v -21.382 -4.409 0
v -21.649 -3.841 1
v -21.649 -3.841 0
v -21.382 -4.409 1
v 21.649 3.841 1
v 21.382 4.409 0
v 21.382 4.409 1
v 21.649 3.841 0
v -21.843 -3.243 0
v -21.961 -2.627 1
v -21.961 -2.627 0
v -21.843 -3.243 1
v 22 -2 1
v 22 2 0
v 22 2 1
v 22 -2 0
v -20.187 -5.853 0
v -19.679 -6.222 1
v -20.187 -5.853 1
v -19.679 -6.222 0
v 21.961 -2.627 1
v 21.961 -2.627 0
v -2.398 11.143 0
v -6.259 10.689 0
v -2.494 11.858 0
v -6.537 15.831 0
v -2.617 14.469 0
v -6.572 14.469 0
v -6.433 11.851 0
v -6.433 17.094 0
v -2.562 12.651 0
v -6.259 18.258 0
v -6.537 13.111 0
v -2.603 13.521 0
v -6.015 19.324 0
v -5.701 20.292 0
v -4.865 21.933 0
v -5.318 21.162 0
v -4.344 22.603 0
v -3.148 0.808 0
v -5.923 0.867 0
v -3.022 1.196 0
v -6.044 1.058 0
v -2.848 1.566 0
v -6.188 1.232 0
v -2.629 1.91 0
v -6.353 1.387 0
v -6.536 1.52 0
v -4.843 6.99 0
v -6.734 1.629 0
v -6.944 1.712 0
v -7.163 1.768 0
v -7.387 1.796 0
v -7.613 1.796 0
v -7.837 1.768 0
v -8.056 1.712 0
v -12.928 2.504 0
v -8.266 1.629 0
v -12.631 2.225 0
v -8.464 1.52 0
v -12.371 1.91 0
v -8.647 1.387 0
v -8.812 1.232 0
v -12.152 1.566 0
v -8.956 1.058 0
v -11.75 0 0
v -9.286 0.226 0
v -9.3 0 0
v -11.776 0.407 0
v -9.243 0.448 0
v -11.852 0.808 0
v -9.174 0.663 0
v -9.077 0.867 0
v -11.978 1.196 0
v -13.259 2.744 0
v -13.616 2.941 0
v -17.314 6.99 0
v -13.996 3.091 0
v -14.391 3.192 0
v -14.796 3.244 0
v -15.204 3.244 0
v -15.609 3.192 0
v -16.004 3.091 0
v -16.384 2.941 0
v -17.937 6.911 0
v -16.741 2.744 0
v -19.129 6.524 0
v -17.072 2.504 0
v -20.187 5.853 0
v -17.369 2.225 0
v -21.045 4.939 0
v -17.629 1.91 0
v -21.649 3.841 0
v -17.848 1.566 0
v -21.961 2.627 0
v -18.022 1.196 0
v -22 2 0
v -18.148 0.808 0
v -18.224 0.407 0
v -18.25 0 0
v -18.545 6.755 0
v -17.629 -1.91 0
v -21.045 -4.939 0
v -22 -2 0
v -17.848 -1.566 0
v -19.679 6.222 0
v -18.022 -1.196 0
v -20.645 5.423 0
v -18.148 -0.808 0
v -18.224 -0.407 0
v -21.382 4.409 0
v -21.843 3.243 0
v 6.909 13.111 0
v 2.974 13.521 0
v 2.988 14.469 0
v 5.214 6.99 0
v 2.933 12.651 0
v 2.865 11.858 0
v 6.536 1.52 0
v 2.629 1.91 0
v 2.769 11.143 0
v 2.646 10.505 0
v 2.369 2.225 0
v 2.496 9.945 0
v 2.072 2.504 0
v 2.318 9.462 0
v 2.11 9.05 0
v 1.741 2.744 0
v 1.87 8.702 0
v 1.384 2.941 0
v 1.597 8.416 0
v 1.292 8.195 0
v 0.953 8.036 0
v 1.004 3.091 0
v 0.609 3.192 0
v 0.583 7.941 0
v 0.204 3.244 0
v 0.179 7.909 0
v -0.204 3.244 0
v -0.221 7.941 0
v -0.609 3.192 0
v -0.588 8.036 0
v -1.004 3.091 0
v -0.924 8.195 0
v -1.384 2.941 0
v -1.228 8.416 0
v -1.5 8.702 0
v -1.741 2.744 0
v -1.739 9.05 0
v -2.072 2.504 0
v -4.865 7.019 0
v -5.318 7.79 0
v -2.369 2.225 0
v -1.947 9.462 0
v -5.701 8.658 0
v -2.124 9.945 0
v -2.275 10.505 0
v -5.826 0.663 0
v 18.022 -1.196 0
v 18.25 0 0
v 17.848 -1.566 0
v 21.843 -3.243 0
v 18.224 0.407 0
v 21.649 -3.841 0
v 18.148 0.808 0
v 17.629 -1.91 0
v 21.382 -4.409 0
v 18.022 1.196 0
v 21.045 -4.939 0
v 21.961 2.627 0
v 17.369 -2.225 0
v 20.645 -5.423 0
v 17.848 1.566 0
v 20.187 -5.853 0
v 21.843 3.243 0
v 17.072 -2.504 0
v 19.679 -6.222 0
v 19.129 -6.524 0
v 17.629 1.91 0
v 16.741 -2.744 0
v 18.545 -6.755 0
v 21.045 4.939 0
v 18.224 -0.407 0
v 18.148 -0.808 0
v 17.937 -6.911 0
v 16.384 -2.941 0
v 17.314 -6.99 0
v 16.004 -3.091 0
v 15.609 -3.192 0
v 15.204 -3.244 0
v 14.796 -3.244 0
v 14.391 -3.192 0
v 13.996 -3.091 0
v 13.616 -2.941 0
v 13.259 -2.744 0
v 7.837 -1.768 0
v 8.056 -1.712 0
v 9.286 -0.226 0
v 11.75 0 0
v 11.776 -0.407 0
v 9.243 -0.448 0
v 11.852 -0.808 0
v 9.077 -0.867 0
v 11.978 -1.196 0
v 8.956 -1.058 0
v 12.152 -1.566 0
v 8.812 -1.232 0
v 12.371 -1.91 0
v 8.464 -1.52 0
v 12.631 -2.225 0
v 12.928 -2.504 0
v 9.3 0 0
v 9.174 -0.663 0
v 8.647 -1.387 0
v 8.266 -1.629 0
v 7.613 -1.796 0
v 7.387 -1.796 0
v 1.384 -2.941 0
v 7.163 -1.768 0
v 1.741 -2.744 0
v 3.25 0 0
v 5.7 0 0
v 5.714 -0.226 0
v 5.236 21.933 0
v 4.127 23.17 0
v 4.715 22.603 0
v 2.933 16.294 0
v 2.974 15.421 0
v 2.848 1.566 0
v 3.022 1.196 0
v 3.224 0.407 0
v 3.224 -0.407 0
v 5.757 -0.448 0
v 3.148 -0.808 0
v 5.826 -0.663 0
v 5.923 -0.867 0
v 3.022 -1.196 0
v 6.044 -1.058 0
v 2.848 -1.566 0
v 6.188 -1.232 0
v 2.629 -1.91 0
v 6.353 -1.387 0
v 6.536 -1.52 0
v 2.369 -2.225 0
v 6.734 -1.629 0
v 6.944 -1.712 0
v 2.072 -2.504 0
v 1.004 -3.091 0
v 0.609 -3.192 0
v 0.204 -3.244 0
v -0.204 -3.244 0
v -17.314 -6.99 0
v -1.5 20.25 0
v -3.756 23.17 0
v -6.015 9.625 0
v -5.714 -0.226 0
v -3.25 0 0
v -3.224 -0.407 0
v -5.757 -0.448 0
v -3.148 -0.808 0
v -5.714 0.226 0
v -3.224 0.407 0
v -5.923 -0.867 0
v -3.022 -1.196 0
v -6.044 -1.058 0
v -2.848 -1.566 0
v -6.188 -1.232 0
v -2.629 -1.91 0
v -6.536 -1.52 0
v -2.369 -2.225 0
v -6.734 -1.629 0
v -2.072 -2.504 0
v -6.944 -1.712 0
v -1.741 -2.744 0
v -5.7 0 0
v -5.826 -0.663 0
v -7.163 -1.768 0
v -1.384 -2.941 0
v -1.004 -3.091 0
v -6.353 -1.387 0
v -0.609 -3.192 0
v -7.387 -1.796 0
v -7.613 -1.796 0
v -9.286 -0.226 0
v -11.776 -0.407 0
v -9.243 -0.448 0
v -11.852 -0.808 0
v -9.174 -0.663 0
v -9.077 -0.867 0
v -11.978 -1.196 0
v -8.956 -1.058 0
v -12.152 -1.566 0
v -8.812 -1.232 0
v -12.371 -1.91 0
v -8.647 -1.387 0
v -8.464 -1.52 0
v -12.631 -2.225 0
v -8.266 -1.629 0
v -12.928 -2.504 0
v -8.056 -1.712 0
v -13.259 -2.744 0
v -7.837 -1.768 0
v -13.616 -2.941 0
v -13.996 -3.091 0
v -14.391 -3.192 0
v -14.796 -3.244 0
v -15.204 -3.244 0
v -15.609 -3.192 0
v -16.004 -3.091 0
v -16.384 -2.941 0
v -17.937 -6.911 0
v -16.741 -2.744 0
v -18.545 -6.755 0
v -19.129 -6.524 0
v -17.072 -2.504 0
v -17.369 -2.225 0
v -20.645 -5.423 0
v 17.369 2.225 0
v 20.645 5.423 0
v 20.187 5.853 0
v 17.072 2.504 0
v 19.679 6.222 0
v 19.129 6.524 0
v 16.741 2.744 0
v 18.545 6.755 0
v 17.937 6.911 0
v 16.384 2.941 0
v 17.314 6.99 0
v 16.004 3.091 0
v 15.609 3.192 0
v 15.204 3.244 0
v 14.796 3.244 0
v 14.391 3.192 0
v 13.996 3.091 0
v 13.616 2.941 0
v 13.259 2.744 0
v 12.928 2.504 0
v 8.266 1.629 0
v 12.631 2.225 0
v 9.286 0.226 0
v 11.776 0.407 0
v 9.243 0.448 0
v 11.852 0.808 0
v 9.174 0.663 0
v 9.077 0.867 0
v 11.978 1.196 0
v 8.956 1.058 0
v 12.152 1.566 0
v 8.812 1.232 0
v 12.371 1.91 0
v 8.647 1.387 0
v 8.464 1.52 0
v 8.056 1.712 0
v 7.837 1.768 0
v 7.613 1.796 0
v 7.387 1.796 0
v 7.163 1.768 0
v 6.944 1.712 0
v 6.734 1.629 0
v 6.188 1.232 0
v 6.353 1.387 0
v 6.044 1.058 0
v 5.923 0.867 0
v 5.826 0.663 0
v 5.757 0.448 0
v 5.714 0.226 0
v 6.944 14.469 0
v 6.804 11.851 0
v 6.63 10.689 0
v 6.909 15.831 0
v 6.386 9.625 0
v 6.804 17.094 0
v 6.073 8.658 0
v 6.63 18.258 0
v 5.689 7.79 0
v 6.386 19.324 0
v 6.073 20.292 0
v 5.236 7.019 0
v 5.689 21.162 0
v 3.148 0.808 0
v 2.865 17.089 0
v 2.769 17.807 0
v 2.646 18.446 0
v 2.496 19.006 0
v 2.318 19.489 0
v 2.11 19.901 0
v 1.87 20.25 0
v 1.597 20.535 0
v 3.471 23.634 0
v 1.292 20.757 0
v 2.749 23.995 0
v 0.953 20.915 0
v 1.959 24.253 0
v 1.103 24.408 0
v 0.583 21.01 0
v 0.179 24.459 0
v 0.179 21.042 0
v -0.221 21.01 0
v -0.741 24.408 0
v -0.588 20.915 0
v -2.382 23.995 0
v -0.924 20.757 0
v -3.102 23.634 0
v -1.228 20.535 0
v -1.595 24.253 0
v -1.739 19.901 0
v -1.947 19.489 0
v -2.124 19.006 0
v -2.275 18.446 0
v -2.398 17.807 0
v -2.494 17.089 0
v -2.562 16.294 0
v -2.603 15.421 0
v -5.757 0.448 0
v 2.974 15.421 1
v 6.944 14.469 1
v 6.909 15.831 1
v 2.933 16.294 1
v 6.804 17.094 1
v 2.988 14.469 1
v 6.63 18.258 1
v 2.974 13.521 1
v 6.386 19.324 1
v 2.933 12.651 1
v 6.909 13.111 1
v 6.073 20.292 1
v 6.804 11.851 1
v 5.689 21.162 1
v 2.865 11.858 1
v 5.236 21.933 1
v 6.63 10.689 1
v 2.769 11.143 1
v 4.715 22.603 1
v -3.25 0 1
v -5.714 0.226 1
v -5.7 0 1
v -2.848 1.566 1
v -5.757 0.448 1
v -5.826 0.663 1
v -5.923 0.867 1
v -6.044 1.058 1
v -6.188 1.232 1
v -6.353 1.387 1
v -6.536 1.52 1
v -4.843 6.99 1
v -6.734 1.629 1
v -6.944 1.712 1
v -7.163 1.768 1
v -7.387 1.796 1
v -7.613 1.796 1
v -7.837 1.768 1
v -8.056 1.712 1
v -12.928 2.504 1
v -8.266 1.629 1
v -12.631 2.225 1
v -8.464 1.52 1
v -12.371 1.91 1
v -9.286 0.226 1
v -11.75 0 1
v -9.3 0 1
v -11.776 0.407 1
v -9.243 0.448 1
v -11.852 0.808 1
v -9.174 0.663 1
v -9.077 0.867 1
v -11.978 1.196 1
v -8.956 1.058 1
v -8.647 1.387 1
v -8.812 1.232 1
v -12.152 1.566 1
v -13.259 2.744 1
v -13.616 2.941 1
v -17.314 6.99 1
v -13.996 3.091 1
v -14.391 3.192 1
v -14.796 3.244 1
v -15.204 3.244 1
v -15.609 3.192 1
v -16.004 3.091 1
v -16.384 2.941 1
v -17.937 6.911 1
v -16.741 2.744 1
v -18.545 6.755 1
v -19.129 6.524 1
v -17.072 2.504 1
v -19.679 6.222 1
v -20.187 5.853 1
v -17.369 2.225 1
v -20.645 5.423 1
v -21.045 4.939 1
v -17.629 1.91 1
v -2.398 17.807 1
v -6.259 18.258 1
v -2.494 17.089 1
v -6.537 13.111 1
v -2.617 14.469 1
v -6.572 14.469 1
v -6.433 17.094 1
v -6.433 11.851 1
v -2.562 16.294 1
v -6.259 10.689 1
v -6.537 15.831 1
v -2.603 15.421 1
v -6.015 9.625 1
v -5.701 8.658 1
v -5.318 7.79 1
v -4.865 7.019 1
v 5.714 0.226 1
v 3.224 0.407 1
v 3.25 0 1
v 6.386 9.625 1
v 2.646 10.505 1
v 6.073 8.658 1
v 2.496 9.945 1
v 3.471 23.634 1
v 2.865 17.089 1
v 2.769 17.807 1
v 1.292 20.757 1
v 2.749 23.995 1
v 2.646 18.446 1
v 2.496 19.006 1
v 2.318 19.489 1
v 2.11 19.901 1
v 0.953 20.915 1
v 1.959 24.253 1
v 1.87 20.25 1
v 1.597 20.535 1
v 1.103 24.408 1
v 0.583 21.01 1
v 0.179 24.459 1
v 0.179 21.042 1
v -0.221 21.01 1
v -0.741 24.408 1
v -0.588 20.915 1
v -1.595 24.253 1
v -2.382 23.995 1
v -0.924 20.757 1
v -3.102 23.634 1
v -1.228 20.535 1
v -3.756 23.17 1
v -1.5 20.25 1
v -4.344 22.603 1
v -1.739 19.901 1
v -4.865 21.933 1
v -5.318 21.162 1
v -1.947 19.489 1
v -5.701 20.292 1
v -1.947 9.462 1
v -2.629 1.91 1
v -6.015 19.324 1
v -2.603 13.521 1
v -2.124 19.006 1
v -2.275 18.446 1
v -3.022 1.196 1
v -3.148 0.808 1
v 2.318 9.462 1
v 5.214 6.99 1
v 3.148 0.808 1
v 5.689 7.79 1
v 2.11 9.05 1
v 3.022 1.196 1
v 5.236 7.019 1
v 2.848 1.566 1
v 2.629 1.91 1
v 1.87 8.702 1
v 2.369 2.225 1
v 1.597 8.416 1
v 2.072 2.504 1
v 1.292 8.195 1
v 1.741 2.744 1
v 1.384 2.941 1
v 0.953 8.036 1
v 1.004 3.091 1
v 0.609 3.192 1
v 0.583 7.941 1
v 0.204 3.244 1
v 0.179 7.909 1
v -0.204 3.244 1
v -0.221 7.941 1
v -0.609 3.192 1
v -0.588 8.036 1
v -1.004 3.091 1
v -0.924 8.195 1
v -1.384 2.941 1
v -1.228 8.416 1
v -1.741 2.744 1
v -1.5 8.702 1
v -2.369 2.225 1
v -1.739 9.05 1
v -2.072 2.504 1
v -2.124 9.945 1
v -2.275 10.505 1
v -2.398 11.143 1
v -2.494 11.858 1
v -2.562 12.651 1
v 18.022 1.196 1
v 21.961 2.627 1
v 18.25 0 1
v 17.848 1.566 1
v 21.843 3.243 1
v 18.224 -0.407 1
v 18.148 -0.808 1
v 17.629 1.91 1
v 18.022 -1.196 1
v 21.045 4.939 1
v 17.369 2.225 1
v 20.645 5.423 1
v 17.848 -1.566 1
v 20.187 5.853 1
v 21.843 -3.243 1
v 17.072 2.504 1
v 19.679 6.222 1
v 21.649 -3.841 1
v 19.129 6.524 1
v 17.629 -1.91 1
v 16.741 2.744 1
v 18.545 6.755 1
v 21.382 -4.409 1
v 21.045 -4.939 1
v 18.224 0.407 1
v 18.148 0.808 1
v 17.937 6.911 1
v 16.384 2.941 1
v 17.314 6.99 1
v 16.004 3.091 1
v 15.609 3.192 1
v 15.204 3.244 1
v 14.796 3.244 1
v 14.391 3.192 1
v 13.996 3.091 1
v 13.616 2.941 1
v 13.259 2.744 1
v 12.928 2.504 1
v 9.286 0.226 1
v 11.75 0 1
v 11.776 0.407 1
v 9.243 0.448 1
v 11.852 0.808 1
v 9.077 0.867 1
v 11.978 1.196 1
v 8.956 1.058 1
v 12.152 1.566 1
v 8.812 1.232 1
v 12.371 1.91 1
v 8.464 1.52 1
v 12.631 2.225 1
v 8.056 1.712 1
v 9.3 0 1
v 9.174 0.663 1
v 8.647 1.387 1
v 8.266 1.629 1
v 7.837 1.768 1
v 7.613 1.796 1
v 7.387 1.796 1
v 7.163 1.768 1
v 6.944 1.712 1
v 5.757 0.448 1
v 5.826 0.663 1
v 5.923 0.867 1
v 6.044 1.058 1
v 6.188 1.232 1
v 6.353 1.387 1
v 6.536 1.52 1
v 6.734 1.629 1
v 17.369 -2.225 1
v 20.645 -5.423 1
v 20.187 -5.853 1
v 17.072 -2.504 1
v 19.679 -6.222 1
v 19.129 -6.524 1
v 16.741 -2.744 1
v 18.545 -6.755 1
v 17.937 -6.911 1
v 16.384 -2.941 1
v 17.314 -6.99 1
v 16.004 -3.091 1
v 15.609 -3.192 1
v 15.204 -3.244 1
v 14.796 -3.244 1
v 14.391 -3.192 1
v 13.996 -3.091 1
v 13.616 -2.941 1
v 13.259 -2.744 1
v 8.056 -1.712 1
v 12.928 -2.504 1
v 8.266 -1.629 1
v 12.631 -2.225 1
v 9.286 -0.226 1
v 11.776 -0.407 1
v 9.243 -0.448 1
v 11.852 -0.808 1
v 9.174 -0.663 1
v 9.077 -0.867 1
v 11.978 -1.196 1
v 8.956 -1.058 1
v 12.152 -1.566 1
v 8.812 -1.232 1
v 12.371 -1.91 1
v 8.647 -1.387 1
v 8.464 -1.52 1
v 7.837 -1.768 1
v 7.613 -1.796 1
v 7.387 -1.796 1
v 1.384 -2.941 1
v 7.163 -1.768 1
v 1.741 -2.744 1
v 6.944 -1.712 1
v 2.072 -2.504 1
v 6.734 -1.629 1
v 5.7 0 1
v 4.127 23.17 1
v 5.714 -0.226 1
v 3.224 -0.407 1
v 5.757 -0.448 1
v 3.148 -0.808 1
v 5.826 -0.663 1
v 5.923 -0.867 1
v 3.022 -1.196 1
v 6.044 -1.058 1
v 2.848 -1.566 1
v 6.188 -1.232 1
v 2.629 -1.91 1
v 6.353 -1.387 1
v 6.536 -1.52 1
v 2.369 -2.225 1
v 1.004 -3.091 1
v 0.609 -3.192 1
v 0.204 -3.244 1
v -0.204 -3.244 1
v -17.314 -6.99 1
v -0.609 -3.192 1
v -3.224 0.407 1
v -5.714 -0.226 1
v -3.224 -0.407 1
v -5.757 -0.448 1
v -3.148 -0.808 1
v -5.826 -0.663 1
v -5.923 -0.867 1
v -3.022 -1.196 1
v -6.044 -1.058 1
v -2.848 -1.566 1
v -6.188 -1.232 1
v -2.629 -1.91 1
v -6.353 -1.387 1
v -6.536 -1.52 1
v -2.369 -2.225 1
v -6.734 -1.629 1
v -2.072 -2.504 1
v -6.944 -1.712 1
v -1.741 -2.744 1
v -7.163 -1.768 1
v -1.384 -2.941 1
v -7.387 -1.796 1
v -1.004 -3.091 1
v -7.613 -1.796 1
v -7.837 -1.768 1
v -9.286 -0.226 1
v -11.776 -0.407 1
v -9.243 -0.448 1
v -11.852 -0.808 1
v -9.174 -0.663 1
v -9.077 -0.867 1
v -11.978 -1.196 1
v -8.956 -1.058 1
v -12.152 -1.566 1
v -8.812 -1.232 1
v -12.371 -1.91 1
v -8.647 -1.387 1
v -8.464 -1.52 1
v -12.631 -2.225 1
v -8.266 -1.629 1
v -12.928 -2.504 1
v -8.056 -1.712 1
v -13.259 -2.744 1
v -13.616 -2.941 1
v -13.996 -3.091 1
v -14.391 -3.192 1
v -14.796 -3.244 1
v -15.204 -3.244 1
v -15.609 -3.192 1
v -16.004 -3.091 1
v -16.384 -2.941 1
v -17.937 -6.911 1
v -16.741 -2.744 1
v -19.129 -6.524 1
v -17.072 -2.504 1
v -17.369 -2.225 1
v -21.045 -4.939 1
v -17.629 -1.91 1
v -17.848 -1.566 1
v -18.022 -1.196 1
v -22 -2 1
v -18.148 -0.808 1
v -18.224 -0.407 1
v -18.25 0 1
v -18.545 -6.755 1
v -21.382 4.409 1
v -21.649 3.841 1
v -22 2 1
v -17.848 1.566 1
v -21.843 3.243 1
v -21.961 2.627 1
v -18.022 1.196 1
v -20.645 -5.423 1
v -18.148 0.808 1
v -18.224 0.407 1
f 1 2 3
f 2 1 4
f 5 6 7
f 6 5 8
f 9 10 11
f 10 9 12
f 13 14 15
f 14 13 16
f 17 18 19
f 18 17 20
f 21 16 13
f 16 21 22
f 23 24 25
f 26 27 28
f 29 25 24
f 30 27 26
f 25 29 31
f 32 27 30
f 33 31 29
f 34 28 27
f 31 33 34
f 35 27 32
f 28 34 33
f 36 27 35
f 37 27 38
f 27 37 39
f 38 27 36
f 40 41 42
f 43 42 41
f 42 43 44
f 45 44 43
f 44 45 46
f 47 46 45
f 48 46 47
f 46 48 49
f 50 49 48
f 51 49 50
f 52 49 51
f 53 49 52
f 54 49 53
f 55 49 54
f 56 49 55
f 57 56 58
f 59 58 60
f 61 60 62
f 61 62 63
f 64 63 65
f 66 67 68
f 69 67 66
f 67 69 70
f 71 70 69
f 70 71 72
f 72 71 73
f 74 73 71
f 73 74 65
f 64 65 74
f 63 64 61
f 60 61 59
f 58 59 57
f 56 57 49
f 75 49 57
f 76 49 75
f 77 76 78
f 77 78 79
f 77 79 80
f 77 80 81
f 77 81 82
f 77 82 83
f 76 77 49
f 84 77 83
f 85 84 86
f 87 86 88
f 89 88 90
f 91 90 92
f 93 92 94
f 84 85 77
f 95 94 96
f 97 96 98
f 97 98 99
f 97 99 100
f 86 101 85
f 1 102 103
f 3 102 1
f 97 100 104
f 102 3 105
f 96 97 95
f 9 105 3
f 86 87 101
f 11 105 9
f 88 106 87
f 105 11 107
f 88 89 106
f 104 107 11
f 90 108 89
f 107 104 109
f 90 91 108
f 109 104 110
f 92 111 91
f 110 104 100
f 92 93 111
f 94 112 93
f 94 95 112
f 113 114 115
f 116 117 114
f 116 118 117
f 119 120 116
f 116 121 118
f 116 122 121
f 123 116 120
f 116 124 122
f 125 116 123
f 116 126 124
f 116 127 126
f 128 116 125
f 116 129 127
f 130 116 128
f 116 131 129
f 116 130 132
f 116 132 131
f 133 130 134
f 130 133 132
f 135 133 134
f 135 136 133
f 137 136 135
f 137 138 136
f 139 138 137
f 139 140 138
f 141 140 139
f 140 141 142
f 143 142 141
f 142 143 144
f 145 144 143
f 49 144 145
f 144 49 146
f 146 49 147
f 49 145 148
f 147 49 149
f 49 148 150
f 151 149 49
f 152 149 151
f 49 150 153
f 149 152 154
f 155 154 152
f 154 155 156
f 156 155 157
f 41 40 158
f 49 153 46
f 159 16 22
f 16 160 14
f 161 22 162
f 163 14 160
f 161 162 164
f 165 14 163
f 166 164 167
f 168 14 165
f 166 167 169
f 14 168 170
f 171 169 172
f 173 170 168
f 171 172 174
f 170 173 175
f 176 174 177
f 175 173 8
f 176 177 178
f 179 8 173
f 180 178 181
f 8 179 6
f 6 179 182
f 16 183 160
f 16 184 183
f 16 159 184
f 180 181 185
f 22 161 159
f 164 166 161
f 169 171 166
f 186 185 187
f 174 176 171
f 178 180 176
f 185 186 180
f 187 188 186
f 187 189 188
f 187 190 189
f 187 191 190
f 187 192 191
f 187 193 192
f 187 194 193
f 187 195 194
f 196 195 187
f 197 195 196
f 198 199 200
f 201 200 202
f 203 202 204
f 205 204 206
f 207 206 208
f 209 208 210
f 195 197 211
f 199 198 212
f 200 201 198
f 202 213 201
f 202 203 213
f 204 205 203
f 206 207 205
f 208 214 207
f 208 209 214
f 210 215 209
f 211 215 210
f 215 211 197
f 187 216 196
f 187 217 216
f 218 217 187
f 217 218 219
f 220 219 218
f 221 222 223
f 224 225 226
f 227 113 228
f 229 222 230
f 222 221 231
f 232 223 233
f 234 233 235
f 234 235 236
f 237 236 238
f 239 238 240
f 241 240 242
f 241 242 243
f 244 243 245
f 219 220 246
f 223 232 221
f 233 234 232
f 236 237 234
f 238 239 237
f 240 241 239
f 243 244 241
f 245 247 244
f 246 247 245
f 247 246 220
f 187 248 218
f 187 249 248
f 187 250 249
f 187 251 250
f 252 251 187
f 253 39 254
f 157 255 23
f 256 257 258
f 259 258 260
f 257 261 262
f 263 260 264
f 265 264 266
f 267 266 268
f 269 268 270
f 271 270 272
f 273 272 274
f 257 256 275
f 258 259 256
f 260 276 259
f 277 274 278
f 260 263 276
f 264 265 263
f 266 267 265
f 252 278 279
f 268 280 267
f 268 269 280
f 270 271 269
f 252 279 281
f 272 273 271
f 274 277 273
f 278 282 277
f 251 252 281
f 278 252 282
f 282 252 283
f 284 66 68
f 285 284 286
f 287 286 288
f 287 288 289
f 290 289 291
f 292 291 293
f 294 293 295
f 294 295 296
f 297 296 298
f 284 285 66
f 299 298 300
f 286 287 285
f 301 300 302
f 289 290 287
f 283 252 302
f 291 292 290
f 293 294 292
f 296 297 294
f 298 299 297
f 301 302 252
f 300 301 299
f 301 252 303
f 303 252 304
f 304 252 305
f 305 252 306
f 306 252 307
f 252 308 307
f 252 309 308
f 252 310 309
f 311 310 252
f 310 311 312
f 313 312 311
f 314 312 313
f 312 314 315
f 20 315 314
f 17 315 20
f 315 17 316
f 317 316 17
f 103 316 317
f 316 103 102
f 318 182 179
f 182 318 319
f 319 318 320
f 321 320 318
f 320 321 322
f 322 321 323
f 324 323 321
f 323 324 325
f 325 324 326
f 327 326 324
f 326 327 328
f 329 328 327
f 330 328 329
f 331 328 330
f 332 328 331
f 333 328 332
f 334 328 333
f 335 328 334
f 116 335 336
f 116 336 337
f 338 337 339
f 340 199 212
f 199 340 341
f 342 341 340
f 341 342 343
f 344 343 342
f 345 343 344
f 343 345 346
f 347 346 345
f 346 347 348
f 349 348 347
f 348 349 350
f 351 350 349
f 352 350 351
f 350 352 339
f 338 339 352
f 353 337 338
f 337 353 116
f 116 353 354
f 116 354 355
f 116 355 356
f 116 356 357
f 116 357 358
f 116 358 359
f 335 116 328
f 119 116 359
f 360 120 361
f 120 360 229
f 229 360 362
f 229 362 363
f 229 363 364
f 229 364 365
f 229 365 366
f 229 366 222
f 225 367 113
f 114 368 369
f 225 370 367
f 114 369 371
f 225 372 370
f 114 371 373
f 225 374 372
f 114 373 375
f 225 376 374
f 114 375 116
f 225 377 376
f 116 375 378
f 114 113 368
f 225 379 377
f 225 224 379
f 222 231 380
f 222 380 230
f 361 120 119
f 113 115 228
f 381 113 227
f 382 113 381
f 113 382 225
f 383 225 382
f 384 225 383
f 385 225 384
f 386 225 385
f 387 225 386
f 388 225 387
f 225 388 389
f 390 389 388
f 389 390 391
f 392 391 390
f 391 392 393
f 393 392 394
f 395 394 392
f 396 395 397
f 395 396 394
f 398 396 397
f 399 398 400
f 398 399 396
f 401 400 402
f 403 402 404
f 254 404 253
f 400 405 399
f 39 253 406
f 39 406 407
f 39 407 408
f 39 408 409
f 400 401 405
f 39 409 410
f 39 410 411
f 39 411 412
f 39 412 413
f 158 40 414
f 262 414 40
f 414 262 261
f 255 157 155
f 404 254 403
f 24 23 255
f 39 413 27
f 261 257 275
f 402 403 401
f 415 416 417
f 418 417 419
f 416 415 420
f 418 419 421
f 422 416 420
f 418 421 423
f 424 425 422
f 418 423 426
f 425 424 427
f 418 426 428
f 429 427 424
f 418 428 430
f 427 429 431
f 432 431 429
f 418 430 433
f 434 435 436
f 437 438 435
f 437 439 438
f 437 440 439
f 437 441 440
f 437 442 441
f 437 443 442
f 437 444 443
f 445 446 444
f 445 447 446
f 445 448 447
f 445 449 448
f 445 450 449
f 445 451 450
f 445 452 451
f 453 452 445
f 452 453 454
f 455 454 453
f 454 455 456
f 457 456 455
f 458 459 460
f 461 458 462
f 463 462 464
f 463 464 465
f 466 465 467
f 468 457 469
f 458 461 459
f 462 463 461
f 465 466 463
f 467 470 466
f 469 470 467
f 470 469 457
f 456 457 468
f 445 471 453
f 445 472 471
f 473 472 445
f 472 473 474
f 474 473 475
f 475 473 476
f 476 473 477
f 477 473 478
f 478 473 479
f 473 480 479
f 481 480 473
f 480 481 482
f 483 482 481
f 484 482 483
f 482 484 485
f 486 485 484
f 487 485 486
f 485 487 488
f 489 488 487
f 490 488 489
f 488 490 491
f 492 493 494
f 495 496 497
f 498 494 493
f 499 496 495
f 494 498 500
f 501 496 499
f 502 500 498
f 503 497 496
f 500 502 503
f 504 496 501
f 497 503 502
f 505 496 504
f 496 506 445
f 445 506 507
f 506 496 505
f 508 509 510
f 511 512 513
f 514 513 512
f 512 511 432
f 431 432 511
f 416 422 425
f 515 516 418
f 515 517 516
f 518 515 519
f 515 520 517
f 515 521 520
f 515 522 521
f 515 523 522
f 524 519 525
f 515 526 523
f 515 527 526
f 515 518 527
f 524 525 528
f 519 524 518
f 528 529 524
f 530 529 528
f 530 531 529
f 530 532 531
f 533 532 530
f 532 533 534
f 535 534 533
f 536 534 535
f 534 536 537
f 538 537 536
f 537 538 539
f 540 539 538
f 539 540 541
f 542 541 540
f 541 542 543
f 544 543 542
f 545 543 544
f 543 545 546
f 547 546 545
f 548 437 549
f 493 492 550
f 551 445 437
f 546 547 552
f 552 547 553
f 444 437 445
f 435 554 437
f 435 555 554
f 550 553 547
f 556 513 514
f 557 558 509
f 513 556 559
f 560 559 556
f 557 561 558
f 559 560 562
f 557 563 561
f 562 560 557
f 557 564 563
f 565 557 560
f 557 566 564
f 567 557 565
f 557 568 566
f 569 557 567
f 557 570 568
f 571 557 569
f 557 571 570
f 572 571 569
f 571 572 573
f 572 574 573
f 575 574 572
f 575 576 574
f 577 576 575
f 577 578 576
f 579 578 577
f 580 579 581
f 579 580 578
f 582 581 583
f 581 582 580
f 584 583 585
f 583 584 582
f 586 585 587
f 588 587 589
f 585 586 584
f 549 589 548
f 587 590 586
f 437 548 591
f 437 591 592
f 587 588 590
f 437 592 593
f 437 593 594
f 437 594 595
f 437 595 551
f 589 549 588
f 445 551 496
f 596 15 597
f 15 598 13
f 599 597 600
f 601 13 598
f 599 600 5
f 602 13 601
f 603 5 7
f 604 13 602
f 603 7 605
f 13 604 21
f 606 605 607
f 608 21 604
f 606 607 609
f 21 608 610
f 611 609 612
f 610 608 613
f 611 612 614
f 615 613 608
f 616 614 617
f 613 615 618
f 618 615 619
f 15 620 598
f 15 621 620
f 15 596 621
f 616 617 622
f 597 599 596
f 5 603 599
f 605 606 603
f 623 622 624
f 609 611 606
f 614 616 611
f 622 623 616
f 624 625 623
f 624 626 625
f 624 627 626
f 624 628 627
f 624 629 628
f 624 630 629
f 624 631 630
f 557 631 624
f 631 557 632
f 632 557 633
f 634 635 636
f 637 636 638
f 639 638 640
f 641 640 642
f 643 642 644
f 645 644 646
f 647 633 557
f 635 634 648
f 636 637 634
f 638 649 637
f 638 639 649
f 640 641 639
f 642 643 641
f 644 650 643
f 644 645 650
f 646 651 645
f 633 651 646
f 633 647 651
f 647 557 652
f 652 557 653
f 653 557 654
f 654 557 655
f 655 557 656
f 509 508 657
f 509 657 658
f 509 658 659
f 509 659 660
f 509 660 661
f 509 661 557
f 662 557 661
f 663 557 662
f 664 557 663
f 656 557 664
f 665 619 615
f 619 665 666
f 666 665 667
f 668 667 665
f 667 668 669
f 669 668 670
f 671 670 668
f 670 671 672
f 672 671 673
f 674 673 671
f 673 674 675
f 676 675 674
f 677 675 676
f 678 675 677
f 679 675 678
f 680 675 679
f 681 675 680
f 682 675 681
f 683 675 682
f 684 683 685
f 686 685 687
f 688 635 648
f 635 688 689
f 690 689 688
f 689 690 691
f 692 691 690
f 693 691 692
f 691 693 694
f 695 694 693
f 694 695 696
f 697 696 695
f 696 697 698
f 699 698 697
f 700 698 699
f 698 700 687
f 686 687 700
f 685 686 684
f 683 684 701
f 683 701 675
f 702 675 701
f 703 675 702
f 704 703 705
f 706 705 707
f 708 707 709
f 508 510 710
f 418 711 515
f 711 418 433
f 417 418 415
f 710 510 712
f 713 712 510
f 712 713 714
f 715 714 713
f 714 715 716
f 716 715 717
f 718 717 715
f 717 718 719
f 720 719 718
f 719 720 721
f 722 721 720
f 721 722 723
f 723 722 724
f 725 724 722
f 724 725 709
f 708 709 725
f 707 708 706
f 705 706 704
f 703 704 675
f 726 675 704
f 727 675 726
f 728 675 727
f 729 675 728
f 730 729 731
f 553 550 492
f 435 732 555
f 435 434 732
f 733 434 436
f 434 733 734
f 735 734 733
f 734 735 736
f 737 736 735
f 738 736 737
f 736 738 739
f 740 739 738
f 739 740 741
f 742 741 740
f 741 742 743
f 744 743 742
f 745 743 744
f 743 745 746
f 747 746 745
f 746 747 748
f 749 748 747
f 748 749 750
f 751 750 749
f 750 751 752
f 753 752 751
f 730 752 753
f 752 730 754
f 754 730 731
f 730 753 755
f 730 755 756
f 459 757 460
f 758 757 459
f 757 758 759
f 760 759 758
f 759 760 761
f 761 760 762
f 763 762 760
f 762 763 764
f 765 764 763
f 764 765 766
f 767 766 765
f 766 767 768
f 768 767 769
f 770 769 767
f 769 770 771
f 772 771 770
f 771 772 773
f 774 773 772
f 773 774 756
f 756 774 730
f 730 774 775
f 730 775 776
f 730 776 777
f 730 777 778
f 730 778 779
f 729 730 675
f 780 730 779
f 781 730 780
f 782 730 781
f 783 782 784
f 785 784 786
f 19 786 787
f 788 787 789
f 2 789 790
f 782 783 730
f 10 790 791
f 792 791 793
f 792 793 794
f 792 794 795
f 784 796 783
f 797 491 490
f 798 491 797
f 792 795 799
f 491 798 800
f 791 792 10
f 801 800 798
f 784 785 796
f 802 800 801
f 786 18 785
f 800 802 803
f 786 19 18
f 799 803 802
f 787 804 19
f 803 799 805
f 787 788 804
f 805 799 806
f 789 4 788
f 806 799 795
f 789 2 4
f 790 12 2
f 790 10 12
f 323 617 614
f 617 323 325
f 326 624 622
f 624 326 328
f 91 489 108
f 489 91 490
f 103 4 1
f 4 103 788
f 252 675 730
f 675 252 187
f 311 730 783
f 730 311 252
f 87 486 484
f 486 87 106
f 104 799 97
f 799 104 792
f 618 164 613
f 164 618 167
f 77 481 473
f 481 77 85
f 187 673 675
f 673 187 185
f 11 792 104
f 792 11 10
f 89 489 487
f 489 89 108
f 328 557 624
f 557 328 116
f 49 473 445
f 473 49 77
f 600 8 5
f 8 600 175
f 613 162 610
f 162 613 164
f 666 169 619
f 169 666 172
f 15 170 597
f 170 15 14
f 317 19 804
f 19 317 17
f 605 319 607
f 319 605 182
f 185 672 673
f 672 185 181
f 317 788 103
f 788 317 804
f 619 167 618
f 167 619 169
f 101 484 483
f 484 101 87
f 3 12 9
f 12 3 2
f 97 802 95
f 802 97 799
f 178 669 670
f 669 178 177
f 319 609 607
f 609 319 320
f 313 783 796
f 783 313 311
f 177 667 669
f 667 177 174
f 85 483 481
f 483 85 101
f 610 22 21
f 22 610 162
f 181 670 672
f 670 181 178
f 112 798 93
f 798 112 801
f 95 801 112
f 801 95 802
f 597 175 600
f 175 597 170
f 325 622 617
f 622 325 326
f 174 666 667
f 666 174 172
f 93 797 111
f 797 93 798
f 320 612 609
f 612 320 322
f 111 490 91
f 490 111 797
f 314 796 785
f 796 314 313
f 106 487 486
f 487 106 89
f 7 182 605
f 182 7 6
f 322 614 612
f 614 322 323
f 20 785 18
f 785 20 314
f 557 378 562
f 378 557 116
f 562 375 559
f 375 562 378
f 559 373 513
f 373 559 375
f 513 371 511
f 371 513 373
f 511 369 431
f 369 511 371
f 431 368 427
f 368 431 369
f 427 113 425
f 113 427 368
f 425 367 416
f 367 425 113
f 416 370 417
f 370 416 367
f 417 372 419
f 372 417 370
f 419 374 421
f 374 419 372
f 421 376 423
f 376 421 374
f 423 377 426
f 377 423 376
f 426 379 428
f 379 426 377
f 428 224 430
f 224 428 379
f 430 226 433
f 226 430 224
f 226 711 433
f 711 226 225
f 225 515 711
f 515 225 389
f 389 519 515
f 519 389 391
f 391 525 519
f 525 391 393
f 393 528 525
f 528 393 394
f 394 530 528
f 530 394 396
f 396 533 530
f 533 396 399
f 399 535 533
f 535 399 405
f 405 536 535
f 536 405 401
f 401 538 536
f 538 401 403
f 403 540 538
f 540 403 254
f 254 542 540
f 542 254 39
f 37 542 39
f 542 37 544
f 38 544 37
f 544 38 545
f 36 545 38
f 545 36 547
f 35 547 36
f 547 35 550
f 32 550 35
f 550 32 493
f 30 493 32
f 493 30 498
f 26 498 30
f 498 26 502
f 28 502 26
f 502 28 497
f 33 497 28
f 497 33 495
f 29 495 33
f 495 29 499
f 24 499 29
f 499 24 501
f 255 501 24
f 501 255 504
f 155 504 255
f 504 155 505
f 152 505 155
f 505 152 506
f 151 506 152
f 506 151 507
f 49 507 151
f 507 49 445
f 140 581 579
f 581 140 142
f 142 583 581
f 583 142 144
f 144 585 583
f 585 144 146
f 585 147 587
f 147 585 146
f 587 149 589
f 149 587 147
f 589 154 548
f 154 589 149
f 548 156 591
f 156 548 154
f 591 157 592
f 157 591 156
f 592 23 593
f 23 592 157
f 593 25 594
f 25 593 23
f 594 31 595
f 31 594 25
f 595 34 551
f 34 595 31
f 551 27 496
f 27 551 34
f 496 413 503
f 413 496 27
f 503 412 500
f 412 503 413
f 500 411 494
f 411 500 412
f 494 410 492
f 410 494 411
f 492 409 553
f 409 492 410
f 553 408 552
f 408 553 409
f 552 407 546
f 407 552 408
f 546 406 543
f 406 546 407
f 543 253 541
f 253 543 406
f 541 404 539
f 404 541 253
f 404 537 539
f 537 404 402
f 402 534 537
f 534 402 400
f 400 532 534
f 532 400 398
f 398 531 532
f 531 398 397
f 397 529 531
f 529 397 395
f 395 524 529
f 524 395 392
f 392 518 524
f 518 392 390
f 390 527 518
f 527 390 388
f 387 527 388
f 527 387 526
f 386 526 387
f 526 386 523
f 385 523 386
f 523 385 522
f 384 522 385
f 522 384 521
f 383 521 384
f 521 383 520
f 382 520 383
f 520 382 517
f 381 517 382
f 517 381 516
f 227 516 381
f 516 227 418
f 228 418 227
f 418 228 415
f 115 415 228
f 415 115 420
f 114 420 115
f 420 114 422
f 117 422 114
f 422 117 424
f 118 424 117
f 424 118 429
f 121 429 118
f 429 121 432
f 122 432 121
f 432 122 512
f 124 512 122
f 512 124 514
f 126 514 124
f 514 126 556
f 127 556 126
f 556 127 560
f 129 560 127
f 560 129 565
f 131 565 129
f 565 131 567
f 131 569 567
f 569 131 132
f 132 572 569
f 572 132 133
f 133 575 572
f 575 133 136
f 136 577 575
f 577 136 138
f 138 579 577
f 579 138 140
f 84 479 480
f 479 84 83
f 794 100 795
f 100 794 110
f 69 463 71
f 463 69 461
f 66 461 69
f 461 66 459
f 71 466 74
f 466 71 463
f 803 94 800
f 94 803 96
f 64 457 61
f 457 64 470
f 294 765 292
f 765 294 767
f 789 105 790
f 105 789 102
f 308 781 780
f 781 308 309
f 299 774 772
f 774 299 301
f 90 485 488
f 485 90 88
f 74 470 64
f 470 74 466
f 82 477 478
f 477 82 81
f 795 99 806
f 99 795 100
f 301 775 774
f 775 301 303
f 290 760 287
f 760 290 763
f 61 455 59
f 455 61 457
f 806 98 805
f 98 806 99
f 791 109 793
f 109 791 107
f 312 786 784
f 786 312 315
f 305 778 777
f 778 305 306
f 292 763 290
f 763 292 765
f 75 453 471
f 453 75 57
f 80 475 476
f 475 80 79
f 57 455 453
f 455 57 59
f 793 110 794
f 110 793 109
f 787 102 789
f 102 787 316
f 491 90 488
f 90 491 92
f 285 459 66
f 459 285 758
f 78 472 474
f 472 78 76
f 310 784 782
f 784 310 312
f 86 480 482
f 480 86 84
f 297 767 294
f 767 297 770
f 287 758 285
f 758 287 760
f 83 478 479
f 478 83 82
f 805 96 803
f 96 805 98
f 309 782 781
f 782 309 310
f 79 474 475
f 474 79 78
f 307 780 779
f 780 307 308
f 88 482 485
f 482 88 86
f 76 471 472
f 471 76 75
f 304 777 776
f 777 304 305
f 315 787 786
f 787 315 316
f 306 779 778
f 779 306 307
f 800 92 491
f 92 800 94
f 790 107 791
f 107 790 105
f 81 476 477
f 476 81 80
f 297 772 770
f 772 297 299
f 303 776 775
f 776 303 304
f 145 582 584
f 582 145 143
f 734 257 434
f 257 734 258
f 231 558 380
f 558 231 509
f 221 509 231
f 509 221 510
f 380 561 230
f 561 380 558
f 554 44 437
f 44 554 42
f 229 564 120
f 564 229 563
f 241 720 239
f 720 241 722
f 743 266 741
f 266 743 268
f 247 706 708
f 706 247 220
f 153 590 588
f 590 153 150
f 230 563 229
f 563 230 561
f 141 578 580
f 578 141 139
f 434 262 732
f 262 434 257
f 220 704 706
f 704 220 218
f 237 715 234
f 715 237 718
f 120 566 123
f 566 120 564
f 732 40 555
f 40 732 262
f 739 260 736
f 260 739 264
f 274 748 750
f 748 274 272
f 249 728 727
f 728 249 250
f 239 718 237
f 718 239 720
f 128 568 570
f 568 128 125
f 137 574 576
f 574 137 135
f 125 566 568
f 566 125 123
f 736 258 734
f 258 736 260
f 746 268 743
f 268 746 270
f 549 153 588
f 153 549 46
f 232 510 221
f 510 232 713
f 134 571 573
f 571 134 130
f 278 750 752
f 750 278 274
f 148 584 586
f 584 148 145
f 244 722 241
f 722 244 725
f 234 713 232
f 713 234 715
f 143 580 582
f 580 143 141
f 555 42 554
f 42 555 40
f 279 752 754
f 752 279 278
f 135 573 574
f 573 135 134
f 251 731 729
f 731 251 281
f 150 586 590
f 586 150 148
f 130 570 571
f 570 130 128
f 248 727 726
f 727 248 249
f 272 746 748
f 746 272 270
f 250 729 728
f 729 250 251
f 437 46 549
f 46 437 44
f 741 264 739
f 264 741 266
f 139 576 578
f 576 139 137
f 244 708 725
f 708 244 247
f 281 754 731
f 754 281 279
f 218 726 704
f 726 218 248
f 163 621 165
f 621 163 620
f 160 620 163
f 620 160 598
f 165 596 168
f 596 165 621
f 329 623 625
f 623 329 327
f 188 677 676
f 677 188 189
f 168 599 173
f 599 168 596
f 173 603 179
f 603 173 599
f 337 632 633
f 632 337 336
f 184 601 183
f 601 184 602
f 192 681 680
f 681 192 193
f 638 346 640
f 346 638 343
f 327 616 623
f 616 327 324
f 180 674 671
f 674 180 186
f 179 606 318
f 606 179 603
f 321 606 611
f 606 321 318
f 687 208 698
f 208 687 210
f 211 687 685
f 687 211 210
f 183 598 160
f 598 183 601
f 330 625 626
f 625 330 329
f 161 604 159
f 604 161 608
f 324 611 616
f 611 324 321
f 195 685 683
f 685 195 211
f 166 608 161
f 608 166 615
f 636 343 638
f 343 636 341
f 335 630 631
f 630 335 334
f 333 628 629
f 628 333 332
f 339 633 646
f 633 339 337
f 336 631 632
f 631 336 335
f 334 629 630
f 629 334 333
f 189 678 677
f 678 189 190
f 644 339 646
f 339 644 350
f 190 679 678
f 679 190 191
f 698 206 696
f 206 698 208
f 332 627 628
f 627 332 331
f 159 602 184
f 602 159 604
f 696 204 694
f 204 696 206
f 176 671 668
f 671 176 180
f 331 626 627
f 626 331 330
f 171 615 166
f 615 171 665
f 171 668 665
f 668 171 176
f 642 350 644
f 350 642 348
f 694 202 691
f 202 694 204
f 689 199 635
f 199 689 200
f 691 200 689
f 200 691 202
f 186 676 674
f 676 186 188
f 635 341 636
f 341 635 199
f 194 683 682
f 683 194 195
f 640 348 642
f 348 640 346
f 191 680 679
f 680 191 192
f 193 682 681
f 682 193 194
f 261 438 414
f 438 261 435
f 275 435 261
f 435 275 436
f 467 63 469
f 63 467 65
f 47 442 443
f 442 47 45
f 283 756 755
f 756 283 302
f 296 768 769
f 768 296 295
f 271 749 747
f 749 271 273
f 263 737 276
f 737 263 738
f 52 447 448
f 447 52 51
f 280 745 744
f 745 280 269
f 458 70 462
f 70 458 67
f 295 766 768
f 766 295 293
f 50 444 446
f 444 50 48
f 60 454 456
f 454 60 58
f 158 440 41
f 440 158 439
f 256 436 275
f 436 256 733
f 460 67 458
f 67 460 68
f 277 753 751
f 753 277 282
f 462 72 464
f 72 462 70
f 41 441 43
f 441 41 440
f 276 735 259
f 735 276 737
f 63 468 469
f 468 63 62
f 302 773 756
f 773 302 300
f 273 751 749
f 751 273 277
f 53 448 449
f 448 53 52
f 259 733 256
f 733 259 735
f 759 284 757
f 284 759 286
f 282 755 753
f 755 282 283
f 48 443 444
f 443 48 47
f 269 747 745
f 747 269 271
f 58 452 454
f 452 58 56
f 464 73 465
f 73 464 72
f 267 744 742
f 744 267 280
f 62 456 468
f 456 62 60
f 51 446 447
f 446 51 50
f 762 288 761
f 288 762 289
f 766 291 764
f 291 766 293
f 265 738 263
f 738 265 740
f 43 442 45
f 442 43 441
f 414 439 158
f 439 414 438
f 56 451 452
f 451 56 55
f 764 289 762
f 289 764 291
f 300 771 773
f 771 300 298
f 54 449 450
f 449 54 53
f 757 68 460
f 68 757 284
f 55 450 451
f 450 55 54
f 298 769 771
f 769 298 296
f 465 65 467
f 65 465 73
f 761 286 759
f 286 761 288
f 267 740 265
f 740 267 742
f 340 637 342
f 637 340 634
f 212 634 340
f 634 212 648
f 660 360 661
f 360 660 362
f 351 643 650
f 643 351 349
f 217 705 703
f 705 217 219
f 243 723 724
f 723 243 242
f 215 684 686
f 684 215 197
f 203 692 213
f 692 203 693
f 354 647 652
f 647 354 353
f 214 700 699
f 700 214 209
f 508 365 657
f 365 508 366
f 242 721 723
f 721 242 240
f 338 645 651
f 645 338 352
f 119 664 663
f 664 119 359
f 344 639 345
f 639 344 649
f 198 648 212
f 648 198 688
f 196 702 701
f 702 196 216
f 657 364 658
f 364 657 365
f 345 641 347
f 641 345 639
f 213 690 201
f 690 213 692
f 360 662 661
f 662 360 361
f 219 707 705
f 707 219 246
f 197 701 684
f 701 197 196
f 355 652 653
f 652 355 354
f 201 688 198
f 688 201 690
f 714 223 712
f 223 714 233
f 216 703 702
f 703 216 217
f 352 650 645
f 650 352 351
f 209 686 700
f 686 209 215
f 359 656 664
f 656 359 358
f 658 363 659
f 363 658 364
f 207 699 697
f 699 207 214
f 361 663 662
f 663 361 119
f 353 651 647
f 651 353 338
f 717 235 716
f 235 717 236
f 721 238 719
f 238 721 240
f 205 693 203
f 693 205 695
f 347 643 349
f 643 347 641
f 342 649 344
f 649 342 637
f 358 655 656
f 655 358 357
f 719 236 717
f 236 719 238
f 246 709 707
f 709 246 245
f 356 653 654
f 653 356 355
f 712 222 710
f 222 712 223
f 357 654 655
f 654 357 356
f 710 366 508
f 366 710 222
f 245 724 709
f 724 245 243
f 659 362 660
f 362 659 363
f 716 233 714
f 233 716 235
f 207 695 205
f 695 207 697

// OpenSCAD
$fn = 50;


difference() {
	union() {
		hull() {
			translate(v = [-17.0000000000, 2.0000000000, 0]) {
				cylinder(h = 1, r = 5);
			}
			translate(v = [17.0000000000, 2.0000000000, 0]) {
				cylinder(h = 1, r = 5);
			}
			translate(v = [-17.0000000000, -2.0000000000, 0]) {
				cylinder(h = 1, r = 5);
			}
			translate(v = [17.0000000000, -2.0000000000, 0]) {
				cylinder(h = 1, r = 5);
			}
		}
		translate(v = [0, 24, 0]) {
			linear_extrude(height = 1) {
				text(font = "DejaVu Sans Mono:style=Bold", halign = "center", size = 19.0000000000, text = "O", valign = "top");
			}
		}
	}
	union() {
		translate(v = [-15.0000000000, 0.0000000000, 0]) {
			translate(v = [0, 0, -100]) {
				cylinder(h = 200, r = 3.2500000000);
			}
		}
		translate(v = [0, 0, -100]) {
			cylinder(h = 200, r = 3.2500000000);
		}
		translate(v = [15.0000000000, 0.0000000000, 0]) {
			translate(v = [0, 0, -100]) {
				cylinder(h = 200, r = 3.2500000000);
			}
		}
		translate(v = [-15.0000000000, 0.0000000000, 0]) {
			translate(v = [0, 0, -100]) {
				cylinder(h = 200, r = 1.8000000000);
			}
		}
		translate(v = [-7.5000000000, 0.0000000000, 0]) {
			translate(v = [0, 0, -100]) {
				cylinder(h = 200, r = 1.8000000000);
			}
		}
		translate(v = [0, 0, -100]) {
			cylinder(h = 200, r = 1.8000000000);
		}
		translate(v = [7.5000000000, 0.0000000000, 0]) {
			translate(v = [0, 0, -100]) {
				cylinder(h = 200, r = 1.8000000000);
			}
		}
		translate(v = [15.0000000000, 0.0000000000, 0]) {
			translate(v = [0, 0, -100]) {
				cylinder(h = 200, r = 1.8000000000);
			}
		}
	}
}
